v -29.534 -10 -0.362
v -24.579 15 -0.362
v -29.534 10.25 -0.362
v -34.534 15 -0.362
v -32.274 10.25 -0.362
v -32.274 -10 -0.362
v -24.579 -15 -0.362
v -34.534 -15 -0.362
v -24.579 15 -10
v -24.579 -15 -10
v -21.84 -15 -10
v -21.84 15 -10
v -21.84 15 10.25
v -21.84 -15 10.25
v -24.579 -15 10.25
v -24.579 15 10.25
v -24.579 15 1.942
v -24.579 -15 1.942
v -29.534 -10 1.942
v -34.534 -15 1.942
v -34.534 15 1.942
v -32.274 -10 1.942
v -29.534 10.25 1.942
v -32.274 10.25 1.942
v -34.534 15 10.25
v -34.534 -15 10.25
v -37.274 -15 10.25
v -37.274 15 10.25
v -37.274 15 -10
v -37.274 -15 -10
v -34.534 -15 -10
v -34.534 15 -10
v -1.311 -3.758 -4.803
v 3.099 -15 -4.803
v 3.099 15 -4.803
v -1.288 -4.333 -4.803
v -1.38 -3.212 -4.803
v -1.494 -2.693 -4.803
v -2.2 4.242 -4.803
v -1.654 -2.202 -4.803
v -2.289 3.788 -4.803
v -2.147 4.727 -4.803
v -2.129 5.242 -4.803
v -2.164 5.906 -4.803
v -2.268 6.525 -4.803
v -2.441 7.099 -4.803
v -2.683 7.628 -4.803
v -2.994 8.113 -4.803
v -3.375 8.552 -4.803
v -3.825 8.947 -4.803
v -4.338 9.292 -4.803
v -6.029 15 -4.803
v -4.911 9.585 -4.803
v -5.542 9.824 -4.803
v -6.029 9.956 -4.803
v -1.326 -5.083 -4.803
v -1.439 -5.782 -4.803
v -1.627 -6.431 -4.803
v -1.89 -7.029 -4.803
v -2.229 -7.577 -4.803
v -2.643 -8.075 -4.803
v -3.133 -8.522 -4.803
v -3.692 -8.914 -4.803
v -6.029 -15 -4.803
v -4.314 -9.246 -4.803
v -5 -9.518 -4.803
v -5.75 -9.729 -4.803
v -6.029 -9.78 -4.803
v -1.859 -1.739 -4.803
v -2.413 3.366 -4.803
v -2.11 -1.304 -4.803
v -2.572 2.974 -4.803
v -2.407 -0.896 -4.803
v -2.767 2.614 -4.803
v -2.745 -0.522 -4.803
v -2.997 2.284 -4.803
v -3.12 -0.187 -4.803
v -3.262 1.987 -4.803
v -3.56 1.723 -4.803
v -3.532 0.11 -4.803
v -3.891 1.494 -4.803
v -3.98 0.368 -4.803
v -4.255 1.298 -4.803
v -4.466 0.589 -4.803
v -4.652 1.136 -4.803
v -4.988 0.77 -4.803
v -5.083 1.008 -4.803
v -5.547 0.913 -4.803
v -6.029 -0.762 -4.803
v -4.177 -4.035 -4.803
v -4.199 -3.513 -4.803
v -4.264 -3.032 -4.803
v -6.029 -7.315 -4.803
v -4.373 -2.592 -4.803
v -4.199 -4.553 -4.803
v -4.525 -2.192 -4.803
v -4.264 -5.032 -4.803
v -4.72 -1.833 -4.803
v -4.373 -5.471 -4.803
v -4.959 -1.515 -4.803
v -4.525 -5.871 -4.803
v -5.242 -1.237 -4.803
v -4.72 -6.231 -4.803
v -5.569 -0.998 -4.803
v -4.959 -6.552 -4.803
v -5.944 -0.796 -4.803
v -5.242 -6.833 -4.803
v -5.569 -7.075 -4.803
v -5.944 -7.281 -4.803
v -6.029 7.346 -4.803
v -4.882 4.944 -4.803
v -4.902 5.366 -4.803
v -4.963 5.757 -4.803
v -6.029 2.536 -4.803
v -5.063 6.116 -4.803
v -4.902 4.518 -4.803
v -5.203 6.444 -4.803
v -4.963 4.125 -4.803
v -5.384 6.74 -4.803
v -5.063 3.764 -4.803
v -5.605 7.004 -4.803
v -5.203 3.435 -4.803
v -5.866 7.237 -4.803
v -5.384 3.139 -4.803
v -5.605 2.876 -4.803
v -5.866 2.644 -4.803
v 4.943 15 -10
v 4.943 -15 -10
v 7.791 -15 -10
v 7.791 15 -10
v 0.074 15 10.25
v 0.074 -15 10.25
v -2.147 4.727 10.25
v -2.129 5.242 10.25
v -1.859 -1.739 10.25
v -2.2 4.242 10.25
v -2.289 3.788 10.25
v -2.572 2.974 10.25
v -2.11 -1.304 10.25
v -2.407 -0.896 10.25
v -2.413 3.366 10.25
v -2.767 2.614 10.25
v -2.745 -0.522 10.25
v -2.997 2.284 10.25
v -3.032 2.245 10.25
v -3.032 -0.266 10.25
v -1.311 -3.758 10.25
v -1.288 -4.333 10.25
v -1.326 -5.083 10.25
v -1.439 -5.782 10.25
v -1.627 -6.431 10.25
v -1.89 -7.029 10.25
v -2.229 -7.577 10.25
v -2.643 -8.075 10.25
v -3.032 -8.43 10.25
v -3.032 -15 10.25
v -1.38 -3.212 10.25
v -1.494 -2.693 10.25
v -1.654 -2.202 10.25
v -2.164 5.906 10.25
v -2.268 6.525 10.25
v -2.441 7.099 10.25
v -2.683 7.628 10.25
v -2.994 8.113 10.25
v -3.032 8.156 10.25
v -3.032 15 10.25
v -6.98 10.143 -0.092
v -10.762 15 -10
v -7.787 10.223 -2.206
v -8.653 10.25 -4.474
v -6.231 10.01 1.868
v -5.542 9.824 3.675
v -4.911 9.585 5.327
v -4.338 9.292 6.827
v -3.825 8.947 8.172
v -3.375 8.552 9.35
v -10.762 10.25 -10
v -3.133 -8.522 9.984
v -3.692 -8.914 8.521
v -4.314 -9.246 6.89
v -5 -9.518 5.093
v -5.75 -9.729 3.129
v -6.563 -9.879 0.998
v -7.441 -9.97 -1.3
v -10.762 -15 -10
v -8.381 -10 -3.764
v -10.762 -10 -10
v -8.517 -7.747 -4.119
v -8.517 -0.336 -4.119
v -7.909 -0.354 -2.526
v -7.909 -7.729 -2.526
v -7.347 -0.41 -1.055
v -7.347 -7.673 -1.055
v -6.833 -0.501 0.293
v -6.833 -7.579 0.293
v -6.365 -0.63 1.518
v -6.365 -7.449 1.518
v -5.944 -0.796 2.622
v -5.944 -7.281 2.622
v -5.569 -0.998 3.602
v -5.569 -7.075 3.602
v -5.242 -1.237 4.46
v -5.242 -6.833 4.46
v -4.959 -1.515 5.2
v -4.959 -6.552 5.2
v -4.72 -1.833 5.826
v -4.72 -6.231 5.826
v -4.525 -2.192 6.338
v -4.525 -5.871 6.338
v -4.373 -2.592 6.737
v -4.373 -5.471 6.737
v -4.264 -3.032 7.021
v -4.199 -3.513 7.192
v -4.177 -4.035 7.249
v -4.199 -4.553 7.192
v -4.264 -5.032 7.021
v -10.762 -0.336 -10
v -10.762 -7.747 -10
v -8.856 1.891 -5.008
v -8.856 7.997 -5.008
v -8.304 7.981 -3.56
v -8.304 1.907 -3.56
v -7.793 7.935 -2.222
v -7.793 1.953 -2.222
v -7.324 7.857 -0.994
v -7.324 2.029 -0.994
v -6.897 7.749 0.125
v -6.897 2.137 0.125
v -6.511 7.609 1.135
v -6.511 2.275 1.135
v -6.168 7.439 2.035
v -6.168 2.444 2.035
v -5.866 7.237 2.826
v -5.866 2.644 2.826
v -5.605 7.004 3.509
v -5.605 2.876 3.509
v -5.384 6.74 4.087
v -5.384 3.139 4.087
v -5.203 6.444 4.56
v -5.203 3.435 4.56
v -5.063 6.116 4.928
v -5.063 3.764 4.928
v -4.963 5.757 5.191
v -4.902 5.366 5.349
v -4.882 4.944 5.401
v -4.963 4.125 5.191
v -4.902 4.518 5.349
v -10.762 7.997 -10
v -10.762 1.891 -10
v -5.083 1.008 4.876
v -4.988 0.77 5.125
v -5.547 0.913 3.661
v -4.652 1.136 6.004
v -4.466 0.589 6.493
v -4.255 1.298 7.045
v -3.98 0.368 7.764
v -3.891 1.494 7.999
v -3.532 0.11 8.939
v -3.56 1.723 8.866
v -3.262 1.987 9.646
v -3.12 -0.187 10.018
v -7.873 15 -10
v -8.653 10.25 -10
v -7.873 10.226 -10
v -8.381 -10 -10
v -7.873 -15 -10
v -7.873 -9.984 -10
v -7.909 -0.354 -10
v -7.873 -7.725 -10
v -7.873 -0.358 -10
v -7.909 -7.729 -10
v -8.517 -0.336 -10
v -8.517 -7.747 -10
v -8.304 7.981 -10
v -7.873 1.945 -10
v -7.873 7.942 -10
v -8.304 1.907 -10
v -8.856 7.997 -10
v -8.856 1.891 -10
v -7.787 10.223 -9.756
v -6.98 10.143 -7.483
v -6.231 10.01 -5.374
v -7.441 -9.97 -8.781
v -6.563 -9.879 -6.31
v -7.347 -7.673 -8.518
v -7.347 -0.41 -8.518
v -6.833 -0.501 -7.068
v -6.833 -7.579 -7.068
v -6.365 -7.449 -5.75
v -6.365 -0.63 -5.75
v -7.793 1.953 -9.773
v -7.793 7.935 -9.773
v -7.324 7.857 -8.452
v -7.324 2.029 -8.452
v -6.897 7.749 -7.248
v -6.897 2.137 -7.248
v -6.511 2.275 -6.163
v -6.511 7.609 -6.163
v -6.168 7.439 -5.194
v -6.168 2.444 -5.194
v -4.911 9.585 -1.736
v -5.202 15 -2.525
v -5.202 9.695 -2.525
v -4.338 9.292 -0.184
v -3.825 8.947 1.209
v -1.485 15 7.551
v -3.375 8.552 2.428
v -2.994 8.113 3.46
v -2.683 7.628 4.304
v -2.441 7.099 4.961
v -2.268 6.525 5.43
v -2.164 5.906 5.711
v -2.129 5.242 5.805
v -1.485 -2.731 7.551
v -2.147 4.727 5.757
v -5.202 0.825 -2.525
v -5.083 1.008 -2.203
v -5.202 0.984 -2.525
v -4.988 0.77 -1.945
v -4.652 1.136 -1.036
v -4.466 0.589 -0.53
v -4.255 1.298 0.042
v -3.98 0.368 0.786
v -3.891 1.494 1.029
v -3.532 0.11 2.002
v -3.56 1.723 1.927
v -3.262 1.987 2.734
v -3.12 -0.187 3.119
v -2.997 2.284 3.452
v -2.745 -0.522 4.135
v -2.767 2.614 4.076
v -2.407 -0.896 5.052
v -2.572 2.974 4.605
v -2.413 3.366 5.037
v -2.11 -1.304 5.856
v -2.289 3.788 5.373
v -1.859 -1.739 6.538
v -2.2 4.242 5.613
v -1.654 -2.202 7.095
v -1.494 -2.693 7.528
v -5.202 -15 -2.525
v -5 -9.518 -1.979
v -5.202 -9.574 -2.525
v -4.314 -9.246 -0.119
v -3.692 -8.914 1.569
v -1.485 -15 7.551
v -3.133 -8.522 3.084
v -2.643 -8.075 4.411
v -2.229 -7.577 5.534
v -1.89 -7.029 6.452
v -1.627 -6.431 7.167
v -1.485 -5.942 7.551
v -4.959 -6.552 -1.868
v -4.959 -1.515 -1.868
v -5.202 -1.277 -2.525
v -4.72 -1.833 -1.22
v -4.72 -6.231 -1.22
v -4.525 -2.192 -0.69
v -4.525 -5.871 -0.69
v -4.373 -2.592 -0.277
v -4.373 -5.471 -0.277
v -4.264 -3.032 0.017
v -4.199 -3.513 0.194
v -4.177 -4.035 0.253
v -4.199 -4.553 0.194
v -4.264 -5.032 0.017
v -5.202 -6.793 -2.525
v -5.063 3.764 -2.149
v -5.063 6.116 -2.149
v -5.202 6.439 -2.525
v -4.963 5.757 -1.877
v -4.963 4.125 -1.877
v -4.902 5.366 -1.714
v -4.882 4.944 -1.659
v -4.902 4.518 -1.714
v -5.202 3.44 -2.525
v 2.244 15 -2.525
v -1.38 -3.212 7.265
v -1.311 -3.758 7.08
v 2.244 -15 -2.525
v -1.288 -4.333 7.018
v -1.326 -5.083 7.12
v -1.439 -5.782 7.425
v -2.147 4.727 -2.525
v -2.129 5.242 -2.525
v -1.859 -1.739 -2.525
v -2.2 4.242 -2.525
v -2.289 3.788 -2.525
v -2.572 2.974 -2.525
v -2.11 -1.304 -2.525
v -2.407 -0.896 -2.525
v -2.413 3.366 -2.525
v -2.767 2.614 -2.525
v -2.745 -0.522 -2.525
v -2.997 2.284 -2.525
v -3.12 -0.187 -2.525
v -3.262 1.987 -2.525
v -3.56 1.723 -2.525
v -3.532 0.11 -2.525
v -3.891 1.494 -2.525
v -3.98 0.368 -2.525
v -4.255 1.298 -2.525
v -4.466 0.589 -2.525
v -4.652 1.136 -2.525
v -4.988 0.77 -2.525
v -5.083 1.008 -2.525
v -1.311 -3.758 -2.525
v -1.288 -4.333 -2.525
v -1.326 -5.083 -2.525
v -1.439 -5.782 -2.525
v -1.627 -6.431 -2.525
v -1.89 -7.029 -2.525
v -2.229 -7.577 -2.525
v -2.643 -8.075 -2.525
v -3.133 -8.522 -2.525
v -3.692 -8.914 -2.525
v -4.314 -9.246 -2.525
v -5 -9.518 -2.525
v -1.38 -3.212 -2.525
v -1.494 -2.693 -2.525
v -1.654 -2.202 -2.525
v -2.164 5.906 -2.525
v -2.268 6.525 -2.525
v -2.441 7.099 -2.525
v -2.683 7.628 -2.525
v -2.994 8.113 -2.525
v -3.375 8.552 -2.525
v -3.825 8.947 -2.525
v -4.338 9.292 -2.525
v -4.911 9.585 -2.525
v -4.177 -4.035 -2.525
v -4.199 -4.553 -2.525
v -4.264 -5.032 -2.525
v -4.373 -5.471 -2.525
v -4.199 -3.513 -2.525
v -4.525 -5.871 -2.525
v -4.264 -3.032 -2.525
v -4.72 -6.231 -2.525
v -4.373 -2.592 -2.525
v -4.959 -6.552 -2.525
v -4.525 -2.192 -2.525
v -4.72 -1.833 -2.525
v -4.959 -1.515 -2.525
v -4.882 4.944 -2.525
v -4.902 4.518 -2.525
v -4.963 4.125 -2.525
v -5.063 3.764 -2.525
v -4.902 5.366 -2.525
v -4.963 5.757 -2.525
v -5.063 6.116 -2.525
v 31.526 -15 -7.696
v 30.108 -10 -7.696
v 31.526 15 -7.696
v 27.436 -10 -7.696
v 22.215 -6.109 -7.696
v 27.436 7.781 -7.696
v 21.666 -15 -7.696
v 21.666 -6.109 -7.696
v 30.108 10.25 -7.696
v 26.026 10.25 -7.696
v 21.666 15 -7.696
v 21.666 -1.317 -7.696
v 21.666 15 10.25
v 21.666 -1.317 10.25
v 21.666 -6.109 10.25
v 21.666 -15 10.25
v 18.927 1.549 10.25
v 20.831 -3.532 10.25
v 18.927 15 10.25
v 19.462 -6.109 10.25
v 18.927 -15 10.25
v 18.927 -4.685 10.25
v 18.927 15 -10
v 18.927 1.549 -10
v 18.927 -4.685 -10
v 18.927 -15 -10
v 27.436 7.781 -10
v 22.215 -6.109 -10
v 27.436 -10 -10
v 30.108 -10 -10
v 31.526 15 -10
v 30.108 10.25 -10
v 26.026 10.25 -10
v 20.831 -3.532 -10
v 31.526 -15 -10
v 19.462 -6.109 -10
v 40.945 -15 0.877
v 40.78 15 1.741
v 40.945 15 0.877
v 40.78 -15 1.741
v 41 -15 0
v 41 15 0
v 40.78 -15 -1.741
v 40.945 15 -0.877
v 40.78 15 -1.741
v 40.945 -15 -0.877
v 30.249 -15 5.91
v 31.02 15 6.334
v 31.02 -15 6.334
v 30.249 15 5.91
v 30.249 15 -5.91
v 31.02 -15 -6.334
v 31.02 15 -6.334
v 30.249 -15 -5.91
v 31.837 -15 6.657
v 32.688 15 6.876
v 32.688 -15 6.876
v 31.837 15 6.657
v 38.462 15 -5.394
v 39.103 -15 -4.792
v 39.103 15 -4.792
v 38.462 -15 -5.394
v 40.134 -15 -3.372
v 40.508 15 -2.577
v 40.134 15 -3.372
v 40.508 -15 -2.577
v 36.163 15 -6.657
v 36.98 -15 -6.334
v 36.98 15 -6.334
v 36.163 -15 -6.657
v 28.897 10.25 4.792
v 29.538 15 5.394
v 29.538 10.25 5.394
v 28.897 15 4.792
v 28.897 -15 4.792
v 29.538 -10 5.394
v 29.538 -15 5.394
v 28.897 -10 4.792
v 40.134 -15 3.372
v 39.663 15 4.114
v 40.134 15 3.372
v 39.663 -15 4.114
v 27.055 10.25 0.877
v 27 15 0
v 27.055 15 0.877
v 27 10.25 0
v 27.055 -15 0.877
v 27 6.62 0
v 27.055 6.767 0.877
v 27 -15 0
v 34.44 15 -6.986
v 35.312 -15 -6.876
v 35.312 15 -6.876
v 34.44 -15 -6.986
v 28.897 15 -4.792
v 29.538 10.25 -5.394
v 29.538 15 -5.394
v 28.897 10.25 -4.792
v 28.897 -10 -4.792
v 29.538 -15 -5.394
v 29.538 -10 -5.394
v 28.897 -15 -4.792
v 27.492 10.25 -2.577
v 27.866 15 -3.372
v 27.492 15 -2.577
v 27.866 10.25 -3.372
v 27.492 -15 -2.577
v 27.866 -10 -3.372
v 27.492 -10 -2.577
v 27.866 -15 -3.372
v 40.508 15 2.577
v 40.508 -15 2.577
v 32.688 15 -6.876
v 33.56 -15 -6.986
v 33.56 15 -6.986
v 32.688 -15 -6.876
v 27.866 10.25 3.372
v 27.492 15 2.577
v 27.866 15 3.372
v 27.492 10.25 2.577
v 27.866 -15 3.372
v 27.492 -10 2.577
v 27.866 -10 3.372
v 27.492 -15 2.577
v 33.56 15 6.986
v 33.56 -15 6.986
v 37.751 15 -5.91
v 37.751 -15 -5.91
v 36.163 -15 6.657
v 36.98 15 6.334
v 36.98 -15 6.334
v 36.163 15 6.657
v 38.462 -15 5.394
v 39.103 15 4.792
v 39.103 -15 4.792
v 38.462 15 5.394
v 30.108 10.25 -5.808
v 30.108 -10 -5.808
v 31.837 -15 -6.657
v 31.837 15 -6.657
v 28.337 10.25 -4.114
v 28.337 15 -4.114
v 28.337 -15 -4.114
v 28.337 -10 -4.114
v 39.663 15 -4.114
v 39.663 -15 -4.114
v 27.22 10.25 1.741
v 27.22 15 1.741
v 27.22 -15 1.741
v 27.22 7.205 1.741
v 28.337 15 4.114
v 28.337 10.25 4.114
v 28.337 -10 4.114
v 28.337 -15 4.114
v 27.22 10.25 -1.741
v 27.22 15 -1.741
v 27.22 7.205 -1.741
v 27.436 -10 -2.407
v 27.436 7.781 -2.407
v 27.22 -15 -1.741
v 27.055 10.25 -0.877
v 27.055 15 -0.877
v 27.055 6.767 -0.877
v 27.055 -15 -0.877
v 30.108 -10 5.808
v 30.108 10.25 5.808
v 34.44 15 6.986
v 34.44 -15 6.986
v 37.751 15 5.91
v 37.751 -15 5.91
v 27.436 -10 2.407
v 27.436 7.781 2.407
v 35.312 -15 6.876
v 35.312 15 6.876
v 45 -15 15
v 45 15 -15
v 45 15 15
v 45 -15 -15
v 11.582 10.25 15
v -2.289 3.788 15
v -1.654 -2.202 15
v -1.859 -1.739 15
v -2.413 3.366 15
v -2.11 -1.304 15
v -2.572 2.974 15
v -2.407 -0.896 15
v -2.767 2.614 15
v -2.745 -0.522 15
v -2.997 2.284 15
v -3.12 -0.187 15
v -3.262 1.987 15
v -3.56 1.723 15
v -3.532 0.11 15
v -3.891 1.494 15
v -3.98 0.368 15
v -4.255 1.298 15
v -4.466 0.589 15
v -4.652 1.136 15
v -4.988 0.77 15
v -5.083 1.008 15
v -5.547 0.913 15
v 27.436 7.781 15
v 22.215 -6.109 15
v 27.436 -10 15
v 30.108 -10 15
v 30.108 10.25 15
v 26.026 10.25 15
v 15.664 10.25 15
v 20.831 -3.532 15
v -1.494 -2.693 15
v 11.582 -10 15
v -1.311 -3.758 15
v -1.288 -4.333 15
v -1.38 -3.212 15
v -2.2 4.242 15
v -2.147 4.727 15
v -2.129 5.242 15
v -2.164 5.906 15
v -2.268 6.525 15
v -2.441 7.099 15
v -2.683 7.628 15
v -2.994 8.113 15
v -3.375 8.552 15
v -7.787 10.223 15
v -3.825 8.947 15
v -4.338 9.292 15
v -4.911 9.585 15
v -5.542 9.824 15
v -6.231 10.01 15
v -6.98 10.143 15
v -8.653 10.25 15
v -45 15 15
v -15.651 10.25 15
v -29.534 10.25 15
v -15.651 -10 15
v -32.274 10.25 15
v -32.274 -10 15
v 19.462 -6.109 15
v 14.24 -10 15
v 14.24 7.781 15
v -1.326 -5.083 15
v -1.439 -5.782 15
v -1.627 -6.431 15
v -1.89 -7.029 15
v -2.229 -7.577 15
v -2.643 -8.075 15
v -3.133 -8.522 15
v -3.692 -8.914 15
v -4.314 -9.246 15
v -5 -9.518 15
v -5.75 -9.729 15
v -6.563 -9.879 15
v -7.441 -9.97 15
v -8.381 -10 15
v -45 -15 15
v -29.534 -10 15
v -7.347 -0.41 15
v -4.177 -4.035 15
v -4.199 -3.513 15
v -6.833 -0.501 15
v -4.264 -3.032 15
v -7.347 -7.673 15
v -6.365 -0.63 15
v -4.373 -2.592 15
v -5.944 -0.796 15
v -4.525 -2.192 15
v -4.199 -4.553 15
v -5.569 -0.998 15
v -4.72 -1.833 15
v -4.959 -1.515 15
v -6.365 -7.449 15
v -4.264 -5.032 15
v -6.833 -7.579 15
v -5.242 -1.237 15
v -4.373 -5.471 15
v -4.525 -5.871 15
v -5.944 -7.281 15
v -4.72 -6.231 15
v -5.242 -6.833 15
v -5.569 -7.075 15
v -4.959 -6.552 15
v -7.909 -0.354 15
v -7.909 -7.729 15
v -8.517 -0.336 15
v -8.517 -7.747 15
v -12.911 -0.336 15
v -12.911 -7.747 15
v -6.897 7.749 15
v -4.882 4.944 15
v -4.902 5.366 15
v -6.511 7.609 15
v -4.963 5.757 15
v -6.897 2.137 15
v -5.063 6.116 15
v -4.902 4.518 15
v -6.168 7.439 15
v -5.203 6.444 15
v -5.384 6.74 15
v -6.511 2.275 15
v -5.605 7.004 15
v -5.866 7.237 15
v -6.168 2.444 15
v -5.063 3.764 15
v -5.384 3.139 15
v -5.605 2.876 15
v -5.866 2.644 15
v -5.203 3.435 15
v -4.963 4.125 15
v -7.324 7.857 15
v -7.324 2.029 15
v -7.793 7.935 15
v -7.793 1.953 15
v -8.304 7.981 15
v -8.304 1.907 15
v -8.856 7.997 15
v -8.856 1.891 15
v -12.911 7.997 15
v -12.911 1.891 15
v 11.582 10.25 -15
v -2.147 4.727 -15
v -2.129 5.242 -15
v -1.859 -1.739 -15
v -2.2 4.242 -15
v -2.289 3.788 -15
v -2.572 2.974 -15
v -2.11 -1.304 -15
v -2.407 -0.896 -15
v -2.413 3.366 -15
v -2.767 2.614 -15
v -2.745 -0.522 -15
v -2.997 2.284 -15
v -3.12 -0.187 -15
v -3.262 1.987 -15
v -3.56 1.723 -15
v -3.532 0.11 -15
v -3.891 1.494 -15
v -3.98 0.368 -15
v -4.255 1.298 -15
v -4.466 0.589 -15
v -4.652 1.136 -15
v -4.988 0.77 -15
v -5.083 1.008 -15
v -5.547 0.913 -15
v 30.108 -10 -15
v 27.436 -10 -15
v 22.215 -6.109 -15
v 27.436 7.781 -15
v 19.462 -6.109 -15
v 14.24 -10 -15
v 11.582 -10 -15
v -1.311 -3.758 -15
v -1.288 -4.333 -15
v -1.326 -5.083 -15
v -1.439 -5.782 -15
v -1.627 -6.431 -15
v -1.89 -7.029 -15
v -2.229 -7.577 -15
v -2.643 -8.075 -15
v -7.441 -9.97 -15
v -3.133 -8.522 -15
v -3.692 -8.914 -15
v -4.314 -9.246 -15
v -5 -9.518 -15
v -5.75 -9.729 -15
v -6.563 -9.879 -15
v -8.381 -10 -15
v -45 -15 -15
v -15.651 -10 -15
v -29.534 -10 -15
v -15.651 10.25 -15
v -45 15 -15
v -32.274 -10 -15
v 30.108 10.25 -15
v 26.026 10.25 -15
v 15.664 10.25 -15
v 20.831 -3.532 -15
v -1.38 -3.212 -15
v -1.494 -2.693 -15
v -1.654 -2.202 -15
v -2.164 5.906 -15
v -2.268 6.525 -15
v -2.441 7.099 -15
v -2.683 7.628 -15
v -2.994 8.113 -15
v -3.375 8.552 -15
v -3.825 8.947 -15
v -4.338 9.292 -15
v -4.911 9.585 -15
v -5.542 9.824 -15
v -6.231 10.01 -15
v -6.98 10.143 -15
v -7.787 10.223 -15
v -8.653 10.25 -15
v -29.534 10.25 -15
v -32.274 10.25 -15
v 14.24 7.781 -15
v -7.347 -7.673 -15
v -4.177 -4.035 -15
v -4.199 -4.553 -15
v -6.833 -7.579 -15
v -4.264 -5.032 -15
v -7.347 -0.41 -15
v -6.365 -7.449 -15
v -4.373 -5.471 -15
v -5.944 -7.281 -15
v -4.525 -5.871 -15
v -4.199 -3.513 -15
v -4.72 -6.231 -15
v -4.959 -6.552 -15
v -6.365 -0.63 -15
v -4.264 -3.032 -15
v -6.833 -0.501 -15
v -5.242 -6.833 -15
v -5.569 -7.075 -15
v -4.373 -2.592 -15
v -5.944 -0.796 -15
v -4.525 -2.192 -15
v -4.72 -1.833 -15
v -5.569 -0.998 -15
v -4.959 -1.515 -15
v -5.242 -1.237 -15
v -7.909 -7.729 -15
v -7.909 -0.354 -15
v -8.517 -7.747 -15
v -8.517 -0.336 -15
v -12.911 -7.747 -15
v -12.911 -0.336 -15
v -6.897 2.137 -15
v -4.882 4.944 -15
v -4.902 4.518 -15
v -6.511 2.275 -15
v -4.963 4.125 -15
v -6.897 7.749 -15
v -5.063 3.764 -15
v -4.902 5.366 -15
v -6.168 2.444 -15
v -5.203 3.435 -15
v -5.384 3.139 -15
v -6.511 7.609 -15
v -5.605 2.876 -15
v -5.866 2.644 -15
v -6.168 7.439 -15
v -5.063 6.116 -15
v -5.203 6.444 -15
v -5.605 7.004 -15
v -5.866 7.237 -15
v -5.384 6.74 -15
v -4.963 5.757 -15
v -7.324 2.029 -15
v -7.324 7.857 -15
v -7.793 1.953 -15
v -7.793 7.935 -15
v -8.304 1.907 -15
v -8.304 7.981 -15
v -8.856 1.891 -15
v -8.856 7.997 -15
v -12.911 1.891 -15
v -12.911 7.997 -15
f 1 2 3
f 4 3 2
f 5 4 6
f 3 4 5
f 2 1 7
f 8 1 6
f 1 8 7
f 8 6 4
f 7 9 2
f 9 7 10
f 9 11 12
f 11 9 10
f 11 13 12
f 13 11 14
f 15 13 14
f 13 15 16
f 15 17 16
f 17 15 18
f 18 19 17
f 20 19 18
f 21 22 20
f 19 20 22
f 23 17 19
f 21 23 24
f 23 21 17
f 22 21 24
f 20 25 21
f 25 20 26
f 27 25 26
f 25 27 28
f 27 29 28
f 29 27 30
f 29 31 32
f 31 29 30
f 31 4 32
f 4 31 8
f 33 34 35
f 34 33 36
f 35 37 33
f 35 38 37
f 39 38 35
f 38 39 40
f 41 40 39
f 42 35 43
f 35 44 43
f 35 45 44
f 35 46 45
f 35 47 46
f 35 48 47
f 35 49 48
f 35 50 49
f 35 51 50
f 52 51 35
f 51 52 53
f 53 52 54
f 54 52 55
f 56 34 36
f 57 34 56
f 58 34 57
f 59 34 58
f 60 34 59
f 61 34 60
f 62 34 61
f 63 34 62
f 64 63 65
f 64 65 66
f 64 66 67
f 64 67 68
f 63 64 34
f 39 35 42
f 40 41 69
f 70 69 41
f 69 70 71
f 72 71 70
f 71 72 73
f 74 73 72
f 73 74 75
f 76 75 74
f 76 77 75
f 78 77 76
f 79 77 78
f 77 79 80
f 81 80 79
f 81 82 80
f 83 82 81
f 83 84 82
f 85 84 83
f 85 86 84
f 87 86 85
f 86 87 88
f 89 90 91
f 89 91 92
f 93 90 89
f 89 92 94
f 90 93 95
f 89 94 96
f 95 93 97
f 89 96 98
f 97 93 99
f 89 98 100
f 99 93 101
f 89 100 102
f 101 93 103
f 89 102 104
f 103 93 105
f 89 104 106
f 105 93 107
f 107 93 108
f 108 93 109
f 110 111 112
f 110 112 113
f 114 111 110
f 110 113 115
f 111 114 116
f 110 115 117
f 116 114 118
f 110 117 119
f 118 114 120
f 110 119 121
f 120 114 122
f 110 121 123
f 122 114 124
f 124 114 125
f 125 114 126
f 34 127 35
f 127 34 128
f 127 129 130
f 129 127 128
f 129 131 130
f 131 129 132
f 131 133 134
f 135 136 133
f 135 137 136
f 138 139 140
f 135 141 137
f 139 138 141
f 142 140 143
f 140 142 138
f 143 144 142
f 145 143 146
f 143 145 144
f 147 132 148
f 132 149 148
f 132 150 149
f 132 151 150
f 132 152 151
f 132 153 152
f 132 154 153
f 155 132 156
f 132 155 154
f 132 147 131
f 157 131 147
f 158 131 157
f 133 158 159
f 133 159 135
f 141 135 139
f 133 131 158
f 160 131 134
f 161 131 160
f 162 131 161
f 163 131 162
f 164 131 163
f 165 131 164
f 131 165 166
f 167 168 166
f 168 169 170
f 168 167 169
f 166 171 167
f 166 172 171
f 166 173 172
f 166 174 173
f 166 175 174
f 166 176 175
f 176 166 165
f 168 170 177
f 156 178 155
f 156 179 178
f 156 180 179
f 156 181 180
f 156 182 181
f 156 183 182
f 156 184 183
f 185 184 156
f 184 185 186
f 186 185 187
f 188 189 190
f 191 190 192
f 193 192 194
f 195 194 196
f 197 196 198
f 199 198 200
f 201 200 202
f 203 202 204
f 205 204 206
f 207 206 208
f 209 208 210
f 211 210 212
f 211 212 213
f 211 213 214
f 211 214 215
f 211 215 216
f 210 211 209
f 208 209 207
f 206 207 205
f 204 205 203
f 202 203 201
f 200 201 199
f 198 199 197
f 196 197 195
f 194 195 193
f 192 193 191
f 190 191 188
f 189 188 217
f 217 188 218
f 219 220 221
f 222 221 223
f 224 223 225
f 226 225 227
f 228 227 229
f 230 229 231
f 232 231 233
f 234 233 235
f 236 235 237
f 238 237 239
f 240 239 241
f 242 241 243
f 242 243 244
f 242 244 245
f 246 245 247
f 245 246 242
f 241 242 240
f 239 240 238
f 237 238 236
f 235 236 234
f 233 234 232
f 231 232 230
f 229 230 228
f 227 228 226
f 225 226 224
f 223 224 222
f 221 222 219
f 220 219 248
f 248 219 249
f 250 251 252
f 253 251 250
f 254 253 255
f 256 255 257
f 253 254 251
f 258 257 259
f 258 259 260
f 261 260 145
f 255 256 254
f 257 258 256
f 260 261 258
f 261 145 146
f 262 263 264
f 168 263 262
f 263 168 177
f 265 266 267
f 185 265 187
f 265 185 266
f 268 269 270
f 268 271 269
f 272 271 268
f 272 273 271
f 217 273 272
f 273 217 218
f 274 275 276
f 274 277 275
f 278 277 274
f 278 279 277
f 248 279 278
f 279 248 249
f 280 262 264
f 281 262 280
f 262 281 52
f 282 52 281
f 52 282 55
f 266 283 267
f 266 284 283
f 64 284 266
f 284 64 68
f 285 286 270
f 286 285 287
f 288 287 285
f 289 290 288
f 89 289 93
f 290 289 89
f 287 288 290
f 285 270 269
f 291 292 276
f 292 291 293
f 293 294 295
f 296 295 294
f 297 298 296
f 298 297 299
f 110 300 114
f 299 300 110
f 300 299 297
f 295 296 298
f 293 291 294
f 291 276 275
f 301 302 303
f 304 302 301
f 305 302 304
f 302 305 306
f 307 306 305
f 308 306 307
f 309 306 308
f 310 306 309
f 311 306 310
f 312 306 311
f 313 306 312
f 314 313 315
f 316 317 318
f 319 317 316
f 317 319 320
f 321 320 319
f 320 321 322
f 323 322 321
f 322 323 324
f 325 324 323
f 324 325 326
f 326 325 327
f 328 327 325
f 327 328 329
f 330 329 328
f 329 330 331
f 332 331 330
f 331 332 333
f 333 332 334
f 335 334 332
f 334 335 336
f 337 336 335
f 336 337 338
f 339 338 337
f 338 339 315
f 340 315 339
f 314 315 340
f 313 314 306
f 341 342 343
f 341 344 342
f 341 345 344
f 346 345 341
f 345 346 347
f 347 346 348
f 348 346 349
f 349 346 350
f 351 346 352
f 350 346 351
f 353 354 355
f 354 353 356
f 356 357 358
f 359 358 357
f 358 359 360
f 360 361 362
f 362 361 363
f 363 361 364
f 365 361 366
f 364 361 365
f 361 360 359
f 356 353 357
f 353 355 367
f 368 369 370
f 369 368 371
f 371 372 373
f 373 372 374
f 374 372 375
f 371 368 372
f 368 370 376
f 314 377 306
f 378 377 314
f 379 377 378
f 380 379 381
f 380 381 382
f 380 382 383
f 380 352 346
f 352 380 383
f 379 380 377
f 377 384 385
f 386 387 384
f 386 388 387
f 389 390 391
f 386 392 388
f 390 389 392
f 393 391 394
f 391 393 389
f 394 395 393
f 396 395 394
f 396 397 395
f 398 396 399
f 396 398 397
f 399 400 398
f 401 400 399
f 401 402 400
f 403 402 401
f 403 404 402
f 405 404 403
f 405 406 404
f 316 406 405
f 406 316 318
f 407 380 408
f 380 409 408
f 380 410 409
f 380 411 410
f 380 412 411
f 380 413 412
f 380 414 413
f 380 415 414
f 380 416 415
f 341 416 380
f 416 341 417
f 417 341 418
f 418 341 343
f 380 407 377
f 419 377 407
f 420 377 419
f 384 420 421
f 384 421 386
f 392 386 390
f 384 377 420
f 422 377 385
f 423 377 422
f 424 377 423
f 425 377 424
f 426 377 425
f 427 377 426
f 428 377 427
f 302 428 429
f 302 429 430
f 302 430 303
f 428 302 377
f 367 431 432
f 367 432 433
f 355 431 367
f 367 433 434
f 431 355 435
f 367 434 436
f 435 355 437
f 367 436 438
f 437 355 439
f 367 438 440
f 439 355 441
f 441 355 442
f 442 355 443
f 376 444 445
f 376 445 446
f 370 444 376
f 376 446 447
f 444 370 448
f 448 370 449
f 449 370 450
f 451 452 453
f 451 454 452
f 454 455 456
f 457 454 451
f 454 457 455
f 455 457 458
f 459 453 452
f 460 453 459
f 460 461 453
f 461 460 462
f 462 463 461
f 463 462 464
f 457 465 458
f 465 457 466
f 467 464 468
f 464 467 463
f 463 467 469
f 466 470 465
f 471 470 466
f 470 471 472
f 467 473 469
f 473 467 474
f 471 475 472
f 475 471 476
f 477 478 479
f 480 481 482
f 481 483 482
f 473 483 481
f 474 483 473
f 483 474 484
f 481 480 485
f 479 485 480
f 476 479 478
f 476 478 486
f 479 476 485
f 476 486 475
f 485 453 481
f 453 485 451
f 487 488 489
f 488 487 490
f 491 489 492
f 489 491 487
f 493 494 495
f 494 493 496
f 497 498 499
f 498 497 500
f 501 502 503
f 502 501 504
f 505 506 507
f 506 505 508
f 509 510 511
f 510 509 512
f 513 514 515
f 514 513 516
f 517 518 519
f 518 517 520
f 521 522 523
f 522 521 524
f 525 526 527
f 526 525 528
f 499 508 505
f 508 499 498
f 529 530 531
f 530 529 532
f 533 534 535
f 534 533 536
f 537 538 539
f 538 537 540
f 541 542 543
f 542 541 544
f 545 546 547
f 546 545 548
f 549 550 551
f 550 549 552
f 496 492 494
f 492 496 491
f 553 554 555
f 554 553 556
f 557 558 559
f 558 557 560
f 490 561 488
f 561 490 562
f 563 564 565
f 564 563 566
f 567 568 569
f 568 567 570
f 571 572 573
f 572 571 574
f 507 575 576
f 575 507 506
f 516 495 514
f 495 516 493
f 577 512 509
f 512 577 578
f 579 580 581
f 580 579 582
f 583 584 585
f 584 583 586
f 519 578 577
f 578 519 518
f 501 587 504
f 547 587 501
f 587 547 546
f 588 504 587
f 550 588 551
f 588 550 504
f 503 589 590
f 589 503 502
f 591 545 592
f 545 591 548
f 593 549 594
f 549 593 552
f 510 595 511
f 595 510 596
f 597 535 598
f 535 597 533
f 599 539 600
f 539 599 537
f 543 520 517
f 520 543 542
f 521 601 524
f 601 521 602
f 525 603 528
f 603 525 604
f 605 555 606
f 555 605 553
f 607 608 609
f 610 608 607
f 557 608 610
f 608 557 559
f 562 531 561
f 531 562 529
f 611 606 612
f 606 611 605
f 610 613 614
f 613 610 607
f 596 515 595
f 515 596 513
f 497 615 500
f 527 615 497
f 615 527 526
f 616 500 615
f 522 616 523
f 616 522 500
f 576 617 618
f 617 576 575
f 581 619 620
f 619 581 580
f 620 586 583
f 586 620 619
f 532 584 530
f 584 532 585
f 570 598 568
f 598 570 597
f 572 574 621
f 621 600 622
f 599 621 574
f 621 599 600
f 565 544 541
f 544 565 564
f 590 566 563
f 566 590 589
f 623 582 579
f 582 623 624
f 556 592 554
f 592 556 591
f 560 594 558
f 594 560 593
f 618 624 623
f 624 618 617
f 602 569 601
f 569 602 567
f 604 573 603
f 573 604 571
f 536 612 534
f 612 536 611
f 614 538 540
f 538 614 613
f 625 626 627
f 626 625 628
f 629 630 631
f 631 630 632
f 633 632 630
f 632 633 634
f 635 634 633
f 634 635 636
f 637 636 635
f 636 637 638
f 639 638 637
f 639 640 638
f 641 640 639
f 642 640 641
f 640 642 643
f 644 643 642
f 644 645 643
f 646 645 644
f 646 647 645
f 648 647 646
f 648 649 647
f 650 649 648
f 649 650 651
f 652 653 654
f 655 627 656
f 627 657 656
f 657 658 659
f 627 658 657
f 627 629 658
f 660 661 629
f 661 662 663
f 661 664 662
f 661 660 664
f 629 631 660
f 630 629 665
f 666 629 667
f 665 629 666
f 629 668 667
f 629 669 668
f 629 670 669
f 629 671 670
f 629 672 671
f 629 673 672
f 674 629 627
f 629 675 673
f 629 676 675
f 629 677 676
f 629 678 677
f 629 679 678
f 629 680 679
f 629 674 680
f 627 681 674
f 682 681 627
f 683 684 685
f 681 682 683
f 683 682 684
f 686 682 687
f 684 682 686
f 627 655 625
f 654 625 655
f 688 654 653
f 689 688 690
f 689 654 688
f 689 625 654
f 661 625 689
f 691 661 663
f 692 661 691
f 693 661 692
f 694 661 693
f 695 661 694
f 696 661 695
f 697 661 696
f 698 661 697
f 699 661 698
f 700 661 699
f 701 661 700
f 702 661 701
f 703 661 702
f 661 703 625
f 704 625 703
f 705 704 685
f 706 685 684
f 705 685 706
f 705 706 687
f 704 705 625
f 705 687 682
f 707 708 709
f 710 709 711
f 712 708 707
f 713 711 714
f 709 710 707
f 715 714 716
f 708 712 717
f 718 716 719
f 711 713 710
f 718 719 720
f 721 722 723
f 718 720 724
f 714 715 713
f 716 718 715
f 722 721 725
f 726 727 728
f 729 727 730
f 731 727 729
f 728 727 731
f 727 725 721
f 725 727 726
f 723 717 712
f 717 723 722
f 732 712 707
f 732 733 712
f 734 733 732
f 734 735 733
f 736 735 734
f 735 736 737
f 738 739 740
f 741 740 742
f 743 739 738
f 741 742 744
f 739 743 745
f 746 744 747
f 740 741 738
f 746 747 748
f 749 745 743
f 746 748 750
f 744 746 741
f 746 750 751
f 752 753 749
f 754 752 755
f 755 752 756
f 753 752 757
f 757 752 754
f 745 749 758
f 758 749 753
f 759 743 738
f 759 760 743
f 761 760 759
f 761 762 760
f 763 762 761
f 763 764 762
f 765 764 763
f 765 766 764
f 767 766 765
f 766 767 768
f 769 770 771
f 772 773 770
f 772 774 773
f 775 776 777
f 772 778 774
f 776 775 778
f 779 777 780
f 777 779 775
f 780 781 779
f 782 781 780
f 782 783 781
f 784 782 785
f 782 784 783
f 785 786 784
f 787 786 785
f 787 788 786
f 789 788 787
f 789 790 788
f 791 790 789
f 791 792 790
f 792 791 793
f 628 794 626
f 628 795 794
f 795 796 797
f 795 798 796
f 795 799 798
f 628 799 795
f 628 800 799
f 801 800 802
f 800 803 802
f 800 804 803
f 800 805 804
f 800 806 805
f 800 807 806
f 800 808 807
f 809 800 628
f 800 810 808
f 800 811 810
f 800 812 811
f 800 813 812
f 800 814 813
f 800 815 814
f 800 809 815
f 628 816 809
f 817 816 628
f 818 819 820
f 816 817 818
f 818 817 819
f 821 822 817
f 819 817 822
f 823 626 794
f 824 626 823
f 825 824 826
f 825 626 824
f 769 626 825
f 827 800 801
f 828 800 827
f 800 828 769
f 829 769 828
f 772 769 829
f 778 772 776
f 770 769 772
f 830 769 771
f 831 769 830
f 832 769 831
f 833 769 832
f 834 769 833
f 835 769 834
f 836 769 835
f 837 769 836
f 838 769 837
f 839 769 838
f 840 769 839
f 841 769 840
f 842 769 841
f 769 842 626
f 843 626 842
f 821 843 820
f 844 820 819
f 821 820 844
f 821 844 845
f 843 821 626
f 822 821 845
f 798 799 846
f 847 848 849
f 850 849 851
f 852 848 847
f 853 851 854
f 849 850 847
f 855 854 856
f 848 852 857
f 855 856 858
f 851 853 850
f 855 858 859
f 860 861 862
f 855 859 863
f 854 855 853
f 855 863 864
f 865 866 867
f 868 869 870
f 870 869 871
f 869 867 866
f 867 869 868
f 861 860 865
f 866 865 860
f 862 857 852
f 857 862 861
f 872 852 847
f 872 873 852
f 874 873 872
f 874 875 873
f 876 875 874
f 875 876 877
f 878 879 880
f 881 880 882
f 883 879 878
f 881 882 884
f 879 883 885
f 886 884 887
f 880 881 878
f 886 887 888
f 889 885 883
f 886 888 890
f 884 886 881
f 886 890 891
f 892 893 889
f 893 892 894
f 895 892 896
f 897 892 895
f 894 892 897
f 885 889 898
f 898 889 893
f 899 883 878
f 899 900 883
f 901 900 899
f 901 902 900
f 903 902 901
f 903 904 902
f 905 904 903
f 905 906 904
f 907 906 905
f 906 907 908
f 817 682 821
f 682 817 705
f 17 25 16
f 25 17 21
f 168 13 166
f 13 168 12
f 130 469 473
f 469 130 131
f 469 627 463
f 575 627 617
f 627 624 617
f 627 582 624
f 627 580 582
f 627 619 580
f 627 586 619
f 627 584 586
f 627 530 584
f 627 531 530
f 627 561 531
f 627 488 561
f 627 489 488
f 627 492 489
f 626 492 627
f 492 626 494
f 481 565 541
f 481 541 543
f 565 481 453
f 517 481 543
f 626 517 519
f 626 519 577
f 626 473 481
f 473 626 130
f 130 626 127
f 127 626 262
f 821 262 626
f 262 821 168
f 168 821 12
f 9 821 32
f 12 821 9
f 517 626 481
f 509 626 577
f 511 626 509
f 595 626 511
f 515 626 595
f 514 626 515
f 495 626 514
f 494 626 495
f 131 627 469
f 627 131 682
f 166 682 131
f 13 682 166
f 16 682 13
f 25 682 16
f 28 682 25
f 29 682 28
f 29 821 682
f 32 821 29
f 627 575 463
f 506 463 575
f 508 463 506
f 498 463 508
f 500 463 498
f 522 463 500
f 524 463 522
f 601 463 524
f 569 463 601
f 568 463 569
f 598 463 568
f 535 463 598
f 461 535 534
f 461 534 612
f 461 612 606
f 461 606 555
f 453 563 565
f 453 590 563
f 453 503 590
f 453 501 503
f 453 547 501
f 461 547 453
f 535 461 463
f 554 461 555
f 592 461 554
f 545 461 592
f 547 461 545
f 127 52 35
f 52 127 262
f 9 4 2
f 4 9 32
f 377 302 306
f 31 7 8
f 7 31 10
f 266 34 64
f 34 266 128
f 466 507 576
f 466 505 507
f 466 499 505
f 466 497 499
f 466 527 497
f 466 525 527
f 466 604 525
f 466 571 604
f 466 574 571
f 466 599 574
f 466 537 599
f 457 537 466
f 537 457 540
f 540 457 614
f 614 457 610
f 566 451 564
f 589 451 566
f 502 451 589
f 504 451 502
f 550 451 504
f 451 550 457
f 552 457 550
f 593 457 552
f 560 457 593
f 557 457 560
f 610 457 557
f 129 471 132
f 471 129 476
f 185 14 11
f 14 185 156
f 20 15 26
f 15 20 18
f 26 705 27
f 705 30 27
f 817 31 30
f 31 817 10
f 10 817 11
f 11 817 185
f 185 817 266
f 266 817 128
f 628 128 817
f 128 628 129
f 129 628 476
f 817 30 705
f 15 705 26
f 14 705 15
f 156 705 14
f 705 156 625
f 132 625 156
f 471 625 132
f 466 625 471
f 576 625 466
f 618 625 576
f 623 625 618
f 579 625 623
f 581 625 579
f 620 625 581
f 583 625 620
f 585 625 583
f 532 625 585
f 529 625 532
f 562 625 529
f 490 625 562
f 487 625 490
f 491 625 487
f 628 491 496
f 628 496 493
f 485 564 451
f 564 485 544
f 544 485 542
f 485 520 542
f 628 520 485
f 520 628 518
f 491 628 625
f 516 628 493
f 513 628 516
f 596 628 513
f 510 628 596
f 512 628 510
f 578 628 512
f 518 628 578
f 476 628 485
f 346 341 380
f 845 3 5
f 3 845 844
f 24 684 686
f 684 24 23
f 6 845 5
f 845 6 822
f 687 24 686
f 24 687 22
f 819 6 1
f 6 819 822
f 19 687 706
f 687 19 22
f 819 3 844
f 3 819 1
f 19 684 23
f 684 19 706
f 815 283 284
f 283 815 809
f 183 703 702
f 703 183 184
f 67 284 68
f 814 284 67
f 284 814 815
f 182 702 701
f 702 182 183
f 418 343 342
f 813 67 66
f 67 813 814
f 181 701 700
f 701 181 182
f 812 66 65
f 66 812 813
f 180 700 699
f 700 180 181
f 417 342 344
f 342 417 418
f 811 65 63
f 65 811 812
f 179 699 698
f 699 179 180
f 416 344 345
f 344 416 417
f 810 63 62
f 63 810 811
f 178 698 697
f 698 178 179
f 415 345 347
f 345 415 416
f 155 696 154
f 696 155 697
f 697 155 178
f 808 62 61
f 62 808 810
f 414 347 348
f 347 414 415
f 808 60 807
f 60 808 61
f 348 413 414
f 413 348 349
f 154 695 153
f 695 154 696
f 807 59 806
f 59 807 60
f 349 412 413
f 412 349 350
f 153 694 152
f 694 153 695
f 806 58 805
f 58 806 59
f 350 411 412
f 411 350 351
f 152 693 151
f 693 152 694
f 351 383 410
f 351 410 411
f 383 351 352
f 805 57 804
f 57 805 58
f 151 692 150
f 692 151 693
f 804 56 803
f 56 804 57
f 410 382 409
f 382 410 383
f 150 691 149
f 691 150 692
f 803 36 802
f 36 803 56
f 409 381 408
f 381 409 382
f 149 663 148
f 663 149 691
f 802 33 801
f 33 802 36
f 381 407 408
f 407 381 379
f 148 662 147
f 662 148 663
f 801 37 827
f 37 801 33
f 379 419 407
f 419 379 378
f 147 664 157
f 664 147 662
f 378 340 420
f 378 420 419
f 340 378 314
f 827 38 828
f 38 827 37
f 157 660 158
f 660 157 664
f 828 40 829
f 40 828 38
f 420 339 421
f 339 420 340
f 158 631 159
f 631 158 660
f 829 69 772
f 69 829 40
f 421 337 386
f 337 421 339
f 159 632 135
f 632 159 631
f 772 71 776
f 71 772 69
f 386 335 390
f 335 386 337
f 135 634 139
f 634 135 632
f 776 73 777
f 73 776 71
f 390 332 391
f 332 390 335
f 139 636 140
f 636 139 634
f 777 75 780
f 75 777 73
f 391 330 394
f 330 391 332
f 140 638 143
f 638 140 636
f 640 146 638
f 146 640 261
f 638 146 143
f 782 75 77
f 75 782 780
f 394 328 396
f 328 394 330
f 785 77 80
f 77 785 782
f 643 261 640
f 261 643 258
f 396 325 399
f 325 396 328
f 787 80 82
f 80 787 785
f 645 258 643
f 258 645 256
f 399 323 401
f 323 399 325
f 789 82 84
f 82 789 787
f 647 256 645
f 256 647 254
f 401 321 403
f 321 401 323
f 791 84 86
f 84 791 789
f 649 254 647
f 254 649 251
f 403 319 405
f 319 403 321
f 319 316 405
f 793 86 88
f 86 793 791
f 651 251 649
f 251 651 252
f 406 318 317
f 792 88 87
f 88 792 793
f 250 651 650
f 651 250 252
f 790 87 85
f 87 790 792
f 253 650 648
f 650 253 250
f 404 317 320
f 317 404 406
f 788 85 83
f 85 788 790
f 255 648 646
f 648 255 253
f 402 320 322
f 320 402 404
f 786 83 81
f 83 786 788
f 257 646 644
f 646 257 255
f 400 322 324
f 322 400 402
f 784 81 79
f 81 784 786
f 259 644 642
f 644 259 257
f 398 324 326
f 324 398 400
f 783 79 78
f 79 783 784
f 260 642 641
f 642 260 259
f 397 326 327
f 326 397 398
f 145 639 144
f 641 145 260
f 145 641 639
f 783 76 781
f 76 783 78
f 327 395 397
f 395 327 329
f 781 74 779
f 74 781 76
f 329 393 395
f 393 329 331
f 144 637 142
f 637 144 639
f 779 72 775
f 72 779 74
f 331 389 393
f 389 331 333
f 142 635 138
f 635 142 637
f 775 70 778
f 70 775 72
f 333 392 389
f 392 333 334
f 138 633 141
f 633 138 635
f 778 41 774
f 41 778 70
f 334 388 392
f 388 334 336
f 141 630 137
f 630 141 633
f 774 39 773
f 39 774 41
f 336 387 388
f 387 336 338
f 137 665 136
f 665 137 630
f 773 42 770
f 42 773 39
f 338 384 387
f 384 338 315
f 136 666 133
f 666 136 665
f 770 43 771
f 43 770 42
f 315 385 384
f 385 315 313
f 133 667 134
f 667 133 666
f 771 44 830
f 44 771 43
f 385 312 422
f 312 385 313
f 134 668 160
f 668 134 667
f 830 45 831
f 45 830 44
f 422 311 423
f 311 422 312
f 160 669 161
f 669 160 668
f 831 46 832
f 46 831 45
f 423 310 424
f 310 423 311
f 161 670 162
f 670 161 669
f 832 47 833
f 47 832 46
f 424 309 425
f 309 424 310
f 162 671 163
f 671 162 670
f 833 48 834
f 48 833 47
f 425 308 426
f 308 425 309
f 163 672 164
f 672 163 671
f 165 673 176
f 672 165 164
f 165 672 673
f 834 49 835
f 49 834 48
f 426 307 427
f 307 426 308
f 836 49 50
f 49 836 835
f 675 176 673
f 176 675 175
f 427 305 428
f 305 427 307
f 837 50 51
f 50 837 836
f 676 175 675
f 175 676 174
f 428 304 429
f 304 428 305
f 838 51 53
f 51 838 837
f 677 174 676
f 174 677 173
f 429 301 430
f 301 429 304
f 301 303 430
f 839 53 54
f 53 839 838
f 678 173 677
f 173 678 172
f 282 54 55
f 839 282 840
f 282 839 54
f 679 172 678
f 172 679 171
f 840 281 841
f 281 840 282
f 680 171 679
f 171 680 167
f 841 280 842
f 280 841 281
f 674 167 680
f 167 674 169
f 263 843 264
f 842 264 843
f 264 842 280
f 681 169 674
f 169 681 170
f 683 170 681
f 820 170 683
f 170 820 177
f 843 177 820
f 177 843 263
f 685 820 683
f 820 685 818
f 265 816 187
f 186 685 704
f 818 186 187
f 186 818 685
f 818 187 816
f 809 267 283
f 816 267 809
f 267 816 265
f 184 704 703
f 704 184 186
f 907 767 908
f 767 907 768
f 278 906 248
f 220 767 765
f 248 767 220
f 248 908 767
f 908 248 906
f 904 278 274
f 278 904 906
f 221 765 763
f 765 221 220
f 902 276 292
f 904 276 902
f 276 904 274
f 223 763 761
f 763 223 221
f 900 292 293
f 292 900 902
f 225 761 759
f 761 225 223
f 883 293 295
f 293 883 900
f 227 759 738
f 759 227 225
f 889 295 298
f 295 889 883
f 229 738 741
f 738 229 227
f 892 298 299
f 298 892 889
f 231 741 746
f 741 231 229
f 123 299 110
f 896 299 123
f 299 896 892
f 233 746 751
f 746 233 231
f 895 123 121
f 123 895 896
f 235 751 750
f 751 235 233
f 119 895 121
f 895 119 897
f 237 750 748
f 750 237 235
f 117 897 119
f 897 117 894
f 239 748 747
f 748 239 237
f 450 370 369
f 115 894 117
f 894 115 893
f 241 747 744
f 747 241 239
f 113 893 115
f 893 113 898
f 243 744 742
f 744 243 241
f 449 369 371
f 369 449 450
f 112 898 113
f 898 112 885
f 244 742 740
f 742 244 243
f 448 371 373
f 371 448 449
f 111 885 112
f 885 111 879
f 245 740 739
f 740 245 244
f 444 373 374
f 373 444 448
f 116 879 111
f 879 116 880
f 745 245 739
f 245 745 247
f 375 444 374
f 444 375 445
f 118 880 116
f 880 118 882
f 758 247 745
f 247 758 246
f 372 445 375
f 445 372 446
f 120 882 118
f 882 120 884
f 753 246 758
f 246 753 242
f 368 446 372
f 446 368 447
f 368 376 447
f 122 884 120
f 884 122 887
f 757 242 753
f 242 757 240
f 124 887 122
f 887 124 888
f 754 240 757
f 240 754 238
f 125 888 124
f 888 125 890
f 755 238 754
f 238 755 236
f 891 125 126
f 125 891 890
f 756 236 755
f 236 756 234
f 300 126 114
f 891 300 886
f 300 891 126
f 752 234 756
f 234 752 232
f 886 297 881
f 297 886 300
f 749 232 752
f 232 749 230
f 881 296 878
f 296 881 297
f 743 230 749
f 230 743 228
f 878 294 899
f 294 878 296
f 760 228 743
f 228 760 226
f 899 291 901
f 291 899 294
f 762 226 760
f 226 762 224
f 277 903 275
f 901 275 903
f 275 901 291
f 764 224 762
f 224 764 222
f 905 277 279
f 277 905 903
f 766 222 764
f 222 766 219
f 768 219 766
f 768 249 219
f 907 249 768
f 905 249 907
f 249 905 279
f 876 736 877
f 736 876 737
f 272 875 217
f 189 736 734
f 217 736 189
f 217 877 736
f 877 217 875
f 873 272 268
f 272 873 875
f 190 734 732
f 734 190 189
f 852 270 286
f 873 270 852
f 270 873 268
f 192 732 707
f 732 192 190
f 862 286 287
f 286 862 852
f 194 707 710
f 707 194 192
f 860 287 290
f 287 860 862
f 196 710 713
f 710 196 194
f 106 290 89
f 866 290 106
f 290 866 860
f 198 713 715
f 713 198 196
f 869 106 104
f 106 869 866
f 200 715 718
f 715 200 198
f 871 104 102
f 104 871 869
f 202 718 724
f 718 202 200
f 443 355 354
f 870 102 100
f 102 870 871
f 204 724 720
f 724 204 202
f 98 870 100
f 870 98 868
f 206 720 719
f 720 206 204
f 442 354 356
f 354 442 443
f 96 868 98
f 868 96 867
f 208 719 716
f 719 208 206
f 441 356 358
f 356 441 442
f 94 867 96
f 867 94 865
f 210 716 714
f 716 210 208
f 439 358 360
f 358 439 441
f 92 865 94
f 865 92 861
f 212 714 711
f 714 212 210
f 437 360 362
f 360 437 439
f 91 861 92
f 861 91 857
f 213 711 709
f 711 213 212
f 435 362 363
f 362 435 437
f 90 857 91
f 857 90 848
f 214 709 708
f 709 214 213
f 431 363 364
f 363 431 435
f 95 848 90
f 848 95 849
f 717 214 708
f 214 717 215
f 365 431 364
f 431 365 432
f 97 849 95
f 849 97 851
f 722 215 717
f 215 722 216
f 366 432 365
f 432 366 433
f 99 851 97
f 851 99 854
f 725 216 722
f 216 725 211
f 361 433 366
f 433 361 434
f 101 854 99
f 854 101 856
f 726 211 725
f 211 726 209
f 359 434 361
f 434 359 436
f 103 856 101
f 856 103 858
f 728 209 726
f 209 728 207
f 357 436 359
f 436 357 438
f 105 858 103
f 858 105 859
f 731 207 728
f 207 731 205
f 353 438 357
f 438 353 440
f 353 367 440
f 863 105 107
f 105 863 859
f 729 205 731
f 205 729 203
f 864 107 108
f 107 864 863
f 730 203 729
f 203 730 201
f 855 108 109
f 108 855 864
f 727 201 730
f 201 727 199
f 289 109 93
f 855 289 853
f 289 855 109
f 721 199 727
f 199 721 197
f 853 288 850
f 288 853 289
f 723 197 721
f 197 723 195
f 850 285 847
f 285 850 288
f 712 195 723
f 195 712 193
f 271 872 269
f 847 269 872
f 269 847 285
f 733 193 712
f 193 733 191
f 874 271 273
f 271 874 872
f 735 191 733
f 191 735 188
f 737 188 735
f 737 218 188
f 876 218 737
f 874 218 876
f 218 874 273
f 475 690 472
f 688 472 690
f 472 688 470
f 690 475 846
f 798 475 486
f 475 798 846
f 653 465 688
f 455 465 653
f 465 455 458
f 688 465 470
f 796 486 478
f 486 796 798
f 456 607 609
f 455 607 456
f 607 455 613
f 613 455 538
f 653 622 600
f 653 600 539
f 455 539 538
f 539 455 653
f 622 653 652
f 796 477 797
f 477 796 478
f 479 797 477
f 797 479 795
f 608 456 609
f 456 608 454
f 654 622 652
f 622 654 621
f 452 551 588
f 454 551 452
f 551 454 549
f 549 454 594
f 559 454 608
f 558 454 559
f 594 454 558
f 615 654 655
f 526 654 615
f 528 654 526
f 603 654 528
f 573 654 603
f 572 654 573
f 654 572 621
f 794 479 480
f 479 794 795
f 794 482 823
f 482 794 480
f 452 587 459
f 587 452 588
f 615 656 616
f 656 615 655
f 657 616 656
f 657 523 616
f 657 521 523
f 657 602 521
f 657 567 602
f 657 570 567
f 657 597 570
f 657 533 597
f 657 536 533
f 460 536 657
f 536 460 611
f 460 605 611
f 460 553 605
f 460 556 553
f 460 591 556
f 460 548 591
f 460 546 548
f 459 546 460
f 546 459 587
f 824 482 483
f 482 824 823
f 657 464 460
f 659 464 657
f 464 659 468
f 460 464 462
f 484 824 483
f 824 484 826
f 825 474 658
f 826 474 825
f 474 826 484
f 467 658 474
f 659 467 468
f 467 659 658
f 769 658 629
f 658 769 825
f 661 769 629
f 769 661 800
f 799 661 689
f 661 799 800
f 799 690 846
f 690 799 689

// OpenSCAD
cl=200;
cw=10;
ch=20;
n=8;

// IBM font is Menin Blue
// should install for all users
// for HAL: Fog Sans style outline

module stripes() {
for(i=[0:n-1]) {
  translate([0,i*cw*2,0])
    cube([cl,cw,ch]);
}
}

module IBM() {
translate([10,5,-10])
//rotate([45,0,0])
linear_extrude(50)
text( "I B M",size=20,font="MeninBlue:style=Normal" , $fn=50);
}

module HAL() {
translate([5,35,5])
rotate([90,0,0]) {
linear_extrude(40)
text( "H A L" ,size=20,font="Fog Sans:style=Outline" , $fn=50);
translate([74,10,0])
cylinder(d=14,h=40,$fn=50);
}    
}

//Arial Black:style=Bold

module build() {
difference(){
  cube([90,30,30]);
  HAL();
  IBM();
}
}

translate([-45,-15,-15])
build();
